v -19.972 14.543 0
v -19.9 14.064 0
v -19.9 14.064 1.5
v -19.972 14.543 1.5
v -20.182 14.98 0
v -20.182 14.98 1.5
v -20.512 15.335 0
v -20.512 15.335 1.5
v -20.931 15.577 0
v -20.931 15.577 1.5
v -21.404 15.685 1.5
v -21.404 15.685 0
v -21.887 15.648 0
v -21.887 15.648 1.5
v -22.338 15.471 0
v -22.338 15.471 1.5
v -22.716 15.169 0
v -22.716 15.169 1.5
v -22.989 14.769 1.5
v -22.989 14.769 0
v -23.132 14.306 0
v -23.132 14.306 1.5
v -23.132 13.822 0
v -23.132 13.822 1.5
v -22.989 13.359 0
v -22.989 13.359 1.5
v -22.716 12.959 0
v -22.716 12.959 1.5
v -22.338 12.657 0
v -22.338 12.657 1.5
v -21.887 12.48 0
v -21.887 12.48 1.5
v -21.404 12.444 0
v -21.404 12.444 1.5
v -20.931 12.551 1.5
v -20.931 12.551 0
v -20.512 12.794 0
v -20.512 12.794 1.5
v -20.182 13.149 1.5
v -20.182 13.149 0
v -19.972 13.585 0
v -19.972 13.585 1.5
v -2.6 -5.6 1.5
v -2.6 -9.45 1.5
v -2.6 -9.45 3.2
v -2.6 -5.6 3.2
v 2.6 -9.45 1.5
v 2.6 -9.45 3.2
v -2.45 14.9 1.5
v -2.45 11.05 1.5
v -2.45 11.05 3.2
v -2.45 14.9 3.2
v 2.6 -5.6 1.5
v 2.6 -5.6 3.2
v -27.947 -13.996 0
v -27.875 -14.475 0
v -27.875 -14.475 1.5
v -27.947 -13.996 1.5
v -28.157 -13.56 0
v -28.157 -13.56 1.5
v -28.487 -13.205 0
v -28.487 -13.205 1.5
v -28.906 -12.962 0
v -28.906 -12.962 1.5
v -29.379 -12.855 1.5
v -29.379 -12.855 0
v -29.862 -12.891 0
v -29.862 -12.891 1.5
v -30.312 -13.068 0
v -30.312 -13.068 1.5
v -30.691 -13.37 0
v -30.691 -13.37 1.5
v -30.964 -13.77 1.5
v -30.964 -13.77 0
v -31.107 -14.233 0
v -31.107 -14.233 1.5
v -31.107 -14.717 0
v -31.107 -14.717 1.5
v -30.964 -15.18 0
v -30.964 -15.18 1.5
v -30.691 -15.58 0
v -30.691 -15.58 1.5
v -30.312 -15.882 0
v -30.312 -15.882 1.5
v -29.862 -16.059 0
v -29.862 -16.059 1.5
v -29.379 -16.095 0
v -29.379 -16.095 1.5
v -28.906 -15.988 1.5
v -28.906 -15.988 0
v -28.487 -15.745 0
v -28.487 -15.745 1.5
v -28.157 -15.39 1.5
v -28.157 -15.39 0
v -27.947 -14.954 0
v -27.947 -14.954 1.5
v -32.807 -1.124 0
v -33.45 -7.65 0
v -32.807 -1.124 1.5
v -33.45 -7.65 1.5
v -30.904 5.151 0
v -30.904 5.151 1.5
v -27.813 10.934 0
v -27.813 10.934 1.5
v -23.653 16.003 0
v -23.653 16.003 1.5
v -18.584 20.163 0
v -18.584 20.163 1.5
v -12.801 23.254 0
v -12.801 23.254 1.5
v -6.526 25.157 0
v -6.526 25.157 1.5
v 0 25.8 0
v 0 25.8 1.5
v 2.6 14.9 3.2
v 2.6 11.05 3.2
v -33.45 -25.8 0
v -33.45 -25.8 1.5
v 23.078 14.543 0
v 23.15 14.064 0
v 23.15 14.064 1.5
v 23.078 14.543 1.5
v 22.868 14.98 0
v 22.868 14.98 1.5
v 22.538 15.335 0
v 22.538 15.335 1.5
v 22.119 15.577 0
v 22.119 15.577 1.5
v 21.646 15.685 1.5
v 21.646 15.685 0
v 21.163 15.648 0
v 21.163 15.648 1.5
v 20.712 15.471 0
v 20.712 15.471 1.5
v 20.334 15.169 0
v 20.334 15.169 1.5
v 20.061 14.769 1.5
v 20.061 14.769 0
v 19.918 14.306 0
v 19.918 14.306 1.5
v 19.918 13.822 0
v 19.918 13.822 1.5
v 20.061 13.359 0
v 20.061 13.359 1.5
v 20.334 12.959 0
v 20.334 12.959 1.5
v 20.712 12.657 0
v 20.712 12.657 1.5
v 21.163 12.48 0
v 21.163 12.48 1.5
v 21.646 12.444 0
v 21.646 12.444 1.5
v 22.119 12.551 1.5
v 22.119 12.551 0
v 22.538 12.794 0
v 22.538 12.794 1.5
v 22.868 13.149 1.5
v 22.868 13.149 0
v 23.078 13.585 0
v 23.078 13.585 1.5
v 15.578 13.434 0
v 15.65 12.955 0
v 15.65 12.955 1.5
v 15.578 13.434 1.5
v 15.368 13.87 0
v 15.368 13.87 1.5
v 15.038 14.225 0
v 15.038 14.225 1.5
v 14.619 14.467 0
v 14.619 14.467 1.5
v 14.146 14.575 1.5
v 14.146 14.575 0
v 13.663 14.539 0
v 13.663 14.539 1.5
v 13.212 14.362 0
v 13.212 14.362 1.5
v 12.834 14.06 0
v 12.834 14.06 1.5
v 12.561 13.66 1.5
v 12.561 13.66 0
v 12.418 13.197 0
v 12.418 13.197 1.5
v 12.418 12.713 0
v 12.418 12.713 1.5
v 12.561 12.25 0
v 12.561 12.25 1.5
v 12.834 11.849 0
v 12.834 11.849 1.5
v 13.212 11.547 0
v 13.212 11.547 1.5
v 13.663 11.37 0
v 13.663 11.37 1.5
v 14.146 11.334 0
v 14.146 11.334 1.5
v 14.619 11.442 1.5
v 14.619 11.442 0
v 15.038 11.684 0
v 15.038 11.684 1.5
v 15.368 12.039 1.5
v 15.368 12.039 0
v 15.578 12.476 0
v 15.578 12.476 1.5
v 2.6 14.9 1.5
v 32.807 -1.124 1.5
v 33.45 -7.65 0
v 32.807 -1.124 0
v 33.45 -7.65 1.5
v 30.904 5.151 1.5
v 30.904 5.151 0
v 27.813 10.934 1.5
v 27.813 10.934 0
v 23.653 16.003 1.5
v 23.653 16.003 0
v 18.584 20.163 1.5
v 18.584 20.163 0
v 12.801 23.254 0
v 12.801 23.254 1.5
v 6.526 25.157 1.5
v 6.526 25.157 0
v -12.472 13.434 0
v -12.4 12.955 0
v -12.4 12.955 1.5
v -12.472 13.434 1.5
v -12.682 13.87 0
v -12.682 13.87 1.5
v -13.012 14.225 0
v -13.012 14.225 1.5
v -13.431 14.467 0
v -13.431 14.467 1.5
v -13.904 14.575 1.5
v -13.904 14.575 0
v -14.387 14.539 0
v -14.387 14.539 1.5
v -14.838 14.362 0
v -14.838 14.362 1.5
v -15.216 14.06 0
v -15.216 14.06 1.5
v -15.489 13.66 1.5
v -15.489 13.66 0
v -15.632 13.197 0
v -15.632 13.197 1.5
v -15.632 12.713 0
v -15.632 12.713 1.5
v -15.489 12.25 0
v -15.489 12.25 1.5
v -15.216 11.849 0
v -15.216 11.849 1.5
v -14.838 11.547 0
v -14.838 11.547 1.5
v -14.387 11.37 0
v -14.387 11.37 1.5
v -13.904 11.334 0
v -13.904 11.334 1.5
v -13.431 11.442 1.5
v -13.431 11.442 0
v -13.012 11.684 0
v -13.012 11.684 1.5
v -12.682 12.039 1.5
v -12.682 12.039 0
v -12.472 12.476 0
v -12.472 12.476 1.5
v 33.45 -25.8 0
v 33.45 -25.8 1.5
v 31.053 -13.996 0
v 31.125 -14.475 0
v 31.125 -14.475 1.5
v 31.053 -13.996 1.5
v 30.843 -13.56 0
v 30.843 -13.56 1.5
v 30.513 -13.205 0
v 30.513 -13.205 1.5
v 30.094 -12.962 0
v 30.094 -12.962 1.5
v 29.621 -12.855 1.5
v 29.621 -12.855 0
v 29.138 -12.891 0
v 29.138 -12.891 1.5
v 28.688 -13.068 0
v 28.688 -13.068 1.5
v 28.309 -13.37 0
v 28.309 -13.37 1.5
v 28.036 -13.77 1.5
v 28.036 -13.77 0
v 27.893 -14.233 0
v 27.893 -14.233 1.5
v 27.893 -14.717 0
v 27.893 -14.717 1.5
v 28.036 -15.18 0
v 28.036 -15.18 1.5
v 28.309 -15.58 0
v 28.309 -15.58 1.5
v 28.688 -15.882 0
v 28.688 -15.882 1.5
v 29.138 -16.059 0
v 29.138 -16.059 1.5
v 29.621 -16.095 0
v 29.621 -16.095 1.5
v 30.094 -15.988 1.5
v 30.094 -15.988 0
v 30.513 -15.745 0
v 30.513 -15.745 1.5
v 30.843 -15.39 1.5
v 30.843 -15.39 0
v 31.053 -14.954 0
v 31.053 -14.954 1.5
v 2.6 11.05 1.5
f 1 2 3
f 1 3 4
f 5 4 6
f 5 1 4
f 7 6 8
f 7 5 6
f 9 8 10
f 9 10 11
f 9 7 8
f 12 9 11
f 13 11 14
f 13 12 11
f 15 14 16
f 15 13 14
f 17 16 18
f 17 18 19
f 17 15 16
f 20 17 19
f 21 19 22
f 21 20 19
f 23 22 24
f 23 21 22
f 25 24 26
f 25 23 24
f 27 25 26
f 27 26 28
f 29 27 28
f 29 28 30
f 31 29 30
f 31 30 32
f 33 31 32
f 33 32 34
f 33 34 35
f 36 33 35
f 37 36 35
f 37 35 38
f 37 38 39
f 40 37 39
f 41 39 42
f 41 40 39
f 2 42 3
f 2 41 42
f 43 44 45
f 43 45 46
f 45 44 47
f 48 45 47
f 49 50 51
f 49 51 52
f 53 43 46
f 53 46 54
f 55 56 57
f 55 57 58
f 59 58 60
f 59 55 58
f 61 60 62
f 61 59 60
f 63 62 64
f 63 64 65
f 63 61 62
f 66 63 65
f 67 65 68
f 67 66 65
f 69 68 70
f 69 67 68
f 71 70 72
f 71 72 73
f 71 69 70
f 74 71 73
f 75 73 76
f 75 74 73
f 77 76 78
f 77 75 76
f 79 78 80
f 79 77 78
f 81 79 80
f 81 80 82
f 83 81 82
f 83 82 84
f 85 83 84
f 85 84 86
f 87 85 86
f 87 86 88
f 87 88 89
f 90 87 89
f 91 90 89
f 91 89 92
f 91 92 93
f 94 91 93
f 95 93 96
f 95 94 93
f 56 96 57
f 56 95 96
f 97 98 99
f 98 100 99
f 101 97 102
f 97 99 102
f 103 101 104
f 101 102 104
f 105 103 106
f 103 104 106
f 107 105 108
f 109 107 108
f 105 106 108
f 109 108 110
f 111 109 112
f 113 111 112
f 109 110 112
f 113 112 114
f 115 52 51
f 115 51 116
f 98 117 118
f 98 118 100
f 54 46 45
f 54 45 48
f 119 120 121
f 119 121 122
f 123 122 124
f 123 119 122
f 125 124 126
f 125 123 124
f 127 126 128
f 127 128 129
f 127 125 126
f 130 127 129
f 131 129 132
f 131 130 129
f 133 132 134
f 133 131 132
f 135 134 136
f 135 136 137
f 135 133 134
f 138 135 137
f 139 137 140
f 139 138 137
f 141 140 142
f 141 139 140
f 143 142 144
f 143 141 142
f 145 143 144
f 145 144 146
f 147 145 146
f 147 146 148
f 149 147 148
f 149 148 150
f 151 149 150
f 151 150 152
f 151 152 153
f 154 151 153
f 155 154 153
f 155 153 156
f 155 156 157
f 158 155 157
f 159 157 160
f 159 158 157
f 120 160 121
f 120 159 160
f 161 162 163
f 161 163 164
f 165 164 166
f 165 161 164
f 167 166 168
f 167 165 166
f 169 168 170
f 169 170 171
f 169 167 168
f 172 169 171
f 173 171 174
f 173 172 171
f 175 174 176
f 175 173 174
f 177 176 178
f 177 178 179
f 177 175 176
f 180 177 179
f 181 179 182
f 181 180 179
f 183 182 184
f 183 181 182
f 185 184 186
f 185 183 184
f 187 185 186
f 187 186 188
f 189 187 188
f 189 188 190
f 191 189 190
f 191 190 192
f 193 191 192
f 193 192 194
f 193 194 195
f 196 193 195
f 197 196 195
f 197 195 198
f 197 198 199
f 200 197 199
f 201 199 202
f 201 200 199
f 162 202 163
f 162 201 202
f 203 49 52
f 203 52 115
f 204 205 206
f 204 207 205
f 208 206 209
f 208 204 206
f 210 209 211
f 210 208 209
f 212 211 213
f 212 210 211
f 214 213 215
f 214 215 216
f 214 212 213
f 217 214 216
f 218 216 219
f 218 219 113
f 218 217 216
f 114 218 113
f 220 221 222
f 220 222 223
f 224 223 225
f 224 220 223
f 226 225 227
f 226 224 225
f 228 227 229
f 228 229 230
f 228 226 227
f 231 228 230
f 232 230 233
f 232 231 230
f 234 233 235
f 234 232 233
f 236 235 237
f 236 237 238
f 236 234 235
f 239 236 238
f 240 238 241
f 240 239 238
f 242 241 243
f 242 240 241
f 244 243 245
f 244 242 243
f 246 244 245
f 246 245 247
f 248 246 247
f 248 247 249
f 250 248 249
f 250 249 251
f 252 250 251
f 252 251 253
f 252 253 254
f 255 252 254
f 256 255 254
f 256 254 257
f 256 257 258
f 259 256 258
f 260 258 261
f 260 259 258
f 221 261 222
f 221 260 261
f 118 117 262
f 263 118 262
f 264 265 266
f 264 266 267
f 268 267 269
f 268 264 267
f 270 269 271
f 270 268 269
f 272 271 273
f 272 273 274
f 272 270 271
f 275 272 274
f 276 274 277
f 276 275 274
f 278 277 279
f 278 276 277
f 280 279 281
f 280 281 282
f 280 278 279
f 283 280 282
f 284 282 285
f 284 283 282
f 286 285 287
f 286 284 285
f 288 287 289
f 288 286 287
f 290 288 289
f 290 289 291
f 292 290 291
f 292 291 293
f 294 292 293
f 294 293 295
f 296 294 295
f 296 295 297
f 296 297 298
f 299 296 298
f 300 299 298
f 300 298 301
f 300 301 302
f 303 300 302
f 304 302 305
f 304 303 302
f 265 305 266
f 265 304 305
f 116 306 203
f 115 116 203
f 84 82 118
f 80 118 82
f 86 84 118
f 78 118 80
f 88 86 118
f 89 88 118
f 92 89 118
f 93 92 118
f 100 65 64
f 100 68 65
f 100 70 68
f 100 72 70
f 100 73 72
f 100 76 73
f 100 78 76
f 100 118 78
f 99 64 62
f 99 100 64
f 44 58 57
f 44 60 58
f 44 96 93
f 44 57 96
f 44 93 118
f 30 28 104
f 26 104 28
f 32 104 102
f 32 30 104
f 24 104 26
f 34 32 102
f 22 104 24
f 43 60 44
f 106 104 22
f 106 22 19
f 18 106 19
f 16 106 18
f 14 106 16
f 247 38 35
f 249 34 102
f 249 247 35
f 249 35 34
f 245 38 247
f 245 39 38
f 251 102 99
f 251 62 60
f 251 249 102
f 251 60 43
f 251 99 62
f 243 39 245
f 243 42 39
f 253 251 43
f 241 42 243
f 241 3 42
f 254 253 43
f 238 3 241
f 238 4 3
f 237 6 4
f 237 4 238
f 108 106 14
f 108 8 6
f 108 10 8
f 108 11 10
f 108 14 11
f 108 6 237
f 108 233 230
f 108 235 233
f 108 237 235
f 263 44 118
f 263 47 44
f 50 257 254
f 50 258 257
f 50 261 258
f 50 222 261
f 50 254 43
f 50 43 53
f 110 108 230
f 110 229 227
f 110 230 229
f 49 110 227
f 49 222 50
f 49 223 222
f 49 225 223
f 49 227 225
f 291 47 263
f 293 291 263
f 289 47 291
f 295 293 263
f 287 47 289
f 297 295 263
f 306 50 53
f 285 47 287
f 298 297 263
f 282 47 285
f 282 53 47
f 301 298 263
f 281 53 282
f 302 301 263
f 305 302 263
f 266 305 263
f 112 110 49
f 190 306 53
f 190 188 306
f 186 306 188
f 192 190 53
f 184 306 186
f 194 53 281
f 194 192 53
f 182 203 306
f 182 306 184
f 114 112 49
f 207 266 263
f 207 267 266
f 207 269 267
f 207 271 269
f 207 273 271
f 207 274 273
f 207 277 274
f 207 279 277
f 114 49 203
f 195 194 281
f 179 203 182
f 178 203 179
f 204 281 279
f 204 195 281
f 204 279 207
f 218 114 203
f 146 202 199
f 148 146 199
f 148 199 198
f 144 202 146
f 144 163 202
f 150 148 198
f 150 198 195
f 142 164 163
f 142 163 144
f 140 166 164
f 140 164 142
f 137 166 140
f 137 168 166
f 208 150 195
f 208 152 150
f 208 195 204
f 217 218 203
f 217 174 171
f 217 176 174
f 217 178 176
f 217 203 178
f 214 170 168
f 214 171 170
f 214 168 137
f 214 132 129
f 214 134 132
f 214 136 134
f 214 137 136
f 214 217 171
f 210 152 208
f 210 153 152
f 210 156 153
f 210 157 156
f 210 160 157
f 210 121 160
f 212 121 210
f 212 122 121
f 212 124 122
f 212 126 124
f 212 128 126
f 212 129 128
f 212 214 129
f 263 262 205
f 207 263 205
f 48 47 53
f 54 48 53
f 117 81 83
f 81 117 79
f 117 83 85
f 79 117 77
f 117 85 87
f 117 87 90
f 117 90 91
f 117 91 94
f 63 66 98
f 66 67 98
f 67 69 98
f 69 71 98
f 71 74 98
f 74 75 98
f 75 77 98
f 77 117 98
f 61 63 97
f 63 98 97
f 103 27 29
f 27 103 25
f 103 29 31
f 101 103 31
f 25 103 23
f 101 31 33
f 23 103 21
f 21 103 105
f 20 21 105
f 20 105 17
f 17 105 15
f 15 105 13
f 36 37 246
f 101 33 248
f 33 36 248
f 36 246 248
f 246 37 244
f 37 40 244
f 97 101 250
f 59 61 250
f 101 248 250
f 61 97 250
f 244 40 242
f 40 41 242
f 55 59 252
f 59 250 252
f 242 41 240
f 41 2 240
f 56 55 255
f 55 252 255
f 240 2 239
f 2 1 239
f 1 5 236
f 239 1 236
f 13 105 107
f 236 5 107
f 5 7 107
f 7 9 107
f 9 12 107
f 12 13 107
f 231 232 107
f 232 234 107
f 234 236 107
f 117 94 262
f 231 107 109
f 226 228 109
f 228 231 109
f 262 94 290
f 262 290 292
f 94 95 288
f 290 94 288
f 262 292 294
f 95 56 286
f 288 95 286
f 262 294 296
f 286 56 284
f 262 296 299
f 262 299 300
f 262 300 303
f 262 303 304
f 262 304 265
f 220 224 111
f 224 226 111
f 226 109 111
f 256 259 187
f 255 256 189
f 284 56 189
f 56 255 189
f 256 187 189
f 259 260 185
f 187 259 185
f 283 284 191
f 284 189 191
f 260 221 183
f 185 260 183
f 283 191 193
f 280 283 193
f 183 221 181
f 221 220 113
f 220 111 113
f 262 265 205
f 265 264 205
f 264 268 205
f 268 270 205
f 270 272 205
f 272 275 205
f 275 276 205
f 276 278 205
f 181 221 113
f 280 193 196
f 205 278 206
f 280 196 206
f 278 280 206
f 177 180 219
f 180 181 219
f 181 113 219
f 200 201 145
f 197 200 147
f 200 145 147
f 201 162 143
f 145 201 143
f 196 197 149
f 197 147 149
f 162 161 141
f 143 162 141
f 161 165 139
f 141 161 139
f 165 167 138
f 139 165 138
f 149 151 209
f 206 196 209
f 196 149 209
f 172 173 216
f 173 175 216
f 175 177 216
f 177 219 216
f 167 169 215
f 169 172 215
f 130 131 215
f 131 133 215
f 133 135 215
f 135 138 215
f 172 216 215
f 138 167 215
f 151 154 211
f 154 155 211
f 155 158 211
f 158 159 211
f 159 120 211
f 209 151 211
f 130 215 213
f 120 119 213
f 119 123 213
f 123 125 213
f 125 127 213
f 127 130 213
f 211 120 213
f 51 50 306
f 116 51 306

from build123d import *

# Parameters (mm, degrees)
F0_W     = 66.9
F0_H     = 51.6
F1_DEPTH = 1.5
F2_R     = 33.44999
F3_R     = 1.625
F4_DEPTH = 1.5
F5_W     = 5.2
F5_H     = 3.85
F5_W_2   = 5.05
F6_DEPTH = 1.7


# Not quite as in the source:
# - a fillet or chamfer is up to 0.001 mm smaller than in the source, because OpenCascade refuses the exact size


with BuildPart() as f1:
    # F0 (on Top) → F1 (new body)
    with BuildSketch(Plane.XY):
        Rectangle(F0_W, F0_H)
    extrude(amount=F1_DEPTH)

    # F2 (radius 33.45 in the source; OpenCascade refuses exactly that, so slightly less here)
    f2_edges = [f1.edges().sort_by_distance(p)[0] for p in [
        (-33.45, 25.8, 0.75),
        (33.45, 25.8, 0.75),
    ]]
    fillet(f2_edges, radius=F2_R)

    # F3 (on Top) → F4 (cut)
    with BuildSketch(Plane.XY):
        with Locations((-21.525, 14.0641658831)):
            Circle(F3_R)
        with Locations((-14.025, 12.9547324661)):
            Circle(F3_R)
        with Locations((21.525, 14.0641658831)):
            Circle(F3_R)
        with Locations((14.025, 12.9547324661)):
            Circle(F3_R)
        with Locations((-29.5, -14.475)):
            Circle(F3_R)
        with Locations((29.5, -14.475)):
            Circle(F3_R)
    extrude(amount=F4_DEPTH, mode=Mode.SUBTRACT)

    # F5 (on face) → F6 (join)
    with BuildSketch(Plane.XY.offset(1.5)):
        with Locations((0, -7.525)):
            Rectangle(F5_W, F5_H)
        with Locations((0.075, 12.975)):
            Rectangle(F5_W_2, F5_H)
    extrude(amount=F6_DEPTH)


solid = f1.part
